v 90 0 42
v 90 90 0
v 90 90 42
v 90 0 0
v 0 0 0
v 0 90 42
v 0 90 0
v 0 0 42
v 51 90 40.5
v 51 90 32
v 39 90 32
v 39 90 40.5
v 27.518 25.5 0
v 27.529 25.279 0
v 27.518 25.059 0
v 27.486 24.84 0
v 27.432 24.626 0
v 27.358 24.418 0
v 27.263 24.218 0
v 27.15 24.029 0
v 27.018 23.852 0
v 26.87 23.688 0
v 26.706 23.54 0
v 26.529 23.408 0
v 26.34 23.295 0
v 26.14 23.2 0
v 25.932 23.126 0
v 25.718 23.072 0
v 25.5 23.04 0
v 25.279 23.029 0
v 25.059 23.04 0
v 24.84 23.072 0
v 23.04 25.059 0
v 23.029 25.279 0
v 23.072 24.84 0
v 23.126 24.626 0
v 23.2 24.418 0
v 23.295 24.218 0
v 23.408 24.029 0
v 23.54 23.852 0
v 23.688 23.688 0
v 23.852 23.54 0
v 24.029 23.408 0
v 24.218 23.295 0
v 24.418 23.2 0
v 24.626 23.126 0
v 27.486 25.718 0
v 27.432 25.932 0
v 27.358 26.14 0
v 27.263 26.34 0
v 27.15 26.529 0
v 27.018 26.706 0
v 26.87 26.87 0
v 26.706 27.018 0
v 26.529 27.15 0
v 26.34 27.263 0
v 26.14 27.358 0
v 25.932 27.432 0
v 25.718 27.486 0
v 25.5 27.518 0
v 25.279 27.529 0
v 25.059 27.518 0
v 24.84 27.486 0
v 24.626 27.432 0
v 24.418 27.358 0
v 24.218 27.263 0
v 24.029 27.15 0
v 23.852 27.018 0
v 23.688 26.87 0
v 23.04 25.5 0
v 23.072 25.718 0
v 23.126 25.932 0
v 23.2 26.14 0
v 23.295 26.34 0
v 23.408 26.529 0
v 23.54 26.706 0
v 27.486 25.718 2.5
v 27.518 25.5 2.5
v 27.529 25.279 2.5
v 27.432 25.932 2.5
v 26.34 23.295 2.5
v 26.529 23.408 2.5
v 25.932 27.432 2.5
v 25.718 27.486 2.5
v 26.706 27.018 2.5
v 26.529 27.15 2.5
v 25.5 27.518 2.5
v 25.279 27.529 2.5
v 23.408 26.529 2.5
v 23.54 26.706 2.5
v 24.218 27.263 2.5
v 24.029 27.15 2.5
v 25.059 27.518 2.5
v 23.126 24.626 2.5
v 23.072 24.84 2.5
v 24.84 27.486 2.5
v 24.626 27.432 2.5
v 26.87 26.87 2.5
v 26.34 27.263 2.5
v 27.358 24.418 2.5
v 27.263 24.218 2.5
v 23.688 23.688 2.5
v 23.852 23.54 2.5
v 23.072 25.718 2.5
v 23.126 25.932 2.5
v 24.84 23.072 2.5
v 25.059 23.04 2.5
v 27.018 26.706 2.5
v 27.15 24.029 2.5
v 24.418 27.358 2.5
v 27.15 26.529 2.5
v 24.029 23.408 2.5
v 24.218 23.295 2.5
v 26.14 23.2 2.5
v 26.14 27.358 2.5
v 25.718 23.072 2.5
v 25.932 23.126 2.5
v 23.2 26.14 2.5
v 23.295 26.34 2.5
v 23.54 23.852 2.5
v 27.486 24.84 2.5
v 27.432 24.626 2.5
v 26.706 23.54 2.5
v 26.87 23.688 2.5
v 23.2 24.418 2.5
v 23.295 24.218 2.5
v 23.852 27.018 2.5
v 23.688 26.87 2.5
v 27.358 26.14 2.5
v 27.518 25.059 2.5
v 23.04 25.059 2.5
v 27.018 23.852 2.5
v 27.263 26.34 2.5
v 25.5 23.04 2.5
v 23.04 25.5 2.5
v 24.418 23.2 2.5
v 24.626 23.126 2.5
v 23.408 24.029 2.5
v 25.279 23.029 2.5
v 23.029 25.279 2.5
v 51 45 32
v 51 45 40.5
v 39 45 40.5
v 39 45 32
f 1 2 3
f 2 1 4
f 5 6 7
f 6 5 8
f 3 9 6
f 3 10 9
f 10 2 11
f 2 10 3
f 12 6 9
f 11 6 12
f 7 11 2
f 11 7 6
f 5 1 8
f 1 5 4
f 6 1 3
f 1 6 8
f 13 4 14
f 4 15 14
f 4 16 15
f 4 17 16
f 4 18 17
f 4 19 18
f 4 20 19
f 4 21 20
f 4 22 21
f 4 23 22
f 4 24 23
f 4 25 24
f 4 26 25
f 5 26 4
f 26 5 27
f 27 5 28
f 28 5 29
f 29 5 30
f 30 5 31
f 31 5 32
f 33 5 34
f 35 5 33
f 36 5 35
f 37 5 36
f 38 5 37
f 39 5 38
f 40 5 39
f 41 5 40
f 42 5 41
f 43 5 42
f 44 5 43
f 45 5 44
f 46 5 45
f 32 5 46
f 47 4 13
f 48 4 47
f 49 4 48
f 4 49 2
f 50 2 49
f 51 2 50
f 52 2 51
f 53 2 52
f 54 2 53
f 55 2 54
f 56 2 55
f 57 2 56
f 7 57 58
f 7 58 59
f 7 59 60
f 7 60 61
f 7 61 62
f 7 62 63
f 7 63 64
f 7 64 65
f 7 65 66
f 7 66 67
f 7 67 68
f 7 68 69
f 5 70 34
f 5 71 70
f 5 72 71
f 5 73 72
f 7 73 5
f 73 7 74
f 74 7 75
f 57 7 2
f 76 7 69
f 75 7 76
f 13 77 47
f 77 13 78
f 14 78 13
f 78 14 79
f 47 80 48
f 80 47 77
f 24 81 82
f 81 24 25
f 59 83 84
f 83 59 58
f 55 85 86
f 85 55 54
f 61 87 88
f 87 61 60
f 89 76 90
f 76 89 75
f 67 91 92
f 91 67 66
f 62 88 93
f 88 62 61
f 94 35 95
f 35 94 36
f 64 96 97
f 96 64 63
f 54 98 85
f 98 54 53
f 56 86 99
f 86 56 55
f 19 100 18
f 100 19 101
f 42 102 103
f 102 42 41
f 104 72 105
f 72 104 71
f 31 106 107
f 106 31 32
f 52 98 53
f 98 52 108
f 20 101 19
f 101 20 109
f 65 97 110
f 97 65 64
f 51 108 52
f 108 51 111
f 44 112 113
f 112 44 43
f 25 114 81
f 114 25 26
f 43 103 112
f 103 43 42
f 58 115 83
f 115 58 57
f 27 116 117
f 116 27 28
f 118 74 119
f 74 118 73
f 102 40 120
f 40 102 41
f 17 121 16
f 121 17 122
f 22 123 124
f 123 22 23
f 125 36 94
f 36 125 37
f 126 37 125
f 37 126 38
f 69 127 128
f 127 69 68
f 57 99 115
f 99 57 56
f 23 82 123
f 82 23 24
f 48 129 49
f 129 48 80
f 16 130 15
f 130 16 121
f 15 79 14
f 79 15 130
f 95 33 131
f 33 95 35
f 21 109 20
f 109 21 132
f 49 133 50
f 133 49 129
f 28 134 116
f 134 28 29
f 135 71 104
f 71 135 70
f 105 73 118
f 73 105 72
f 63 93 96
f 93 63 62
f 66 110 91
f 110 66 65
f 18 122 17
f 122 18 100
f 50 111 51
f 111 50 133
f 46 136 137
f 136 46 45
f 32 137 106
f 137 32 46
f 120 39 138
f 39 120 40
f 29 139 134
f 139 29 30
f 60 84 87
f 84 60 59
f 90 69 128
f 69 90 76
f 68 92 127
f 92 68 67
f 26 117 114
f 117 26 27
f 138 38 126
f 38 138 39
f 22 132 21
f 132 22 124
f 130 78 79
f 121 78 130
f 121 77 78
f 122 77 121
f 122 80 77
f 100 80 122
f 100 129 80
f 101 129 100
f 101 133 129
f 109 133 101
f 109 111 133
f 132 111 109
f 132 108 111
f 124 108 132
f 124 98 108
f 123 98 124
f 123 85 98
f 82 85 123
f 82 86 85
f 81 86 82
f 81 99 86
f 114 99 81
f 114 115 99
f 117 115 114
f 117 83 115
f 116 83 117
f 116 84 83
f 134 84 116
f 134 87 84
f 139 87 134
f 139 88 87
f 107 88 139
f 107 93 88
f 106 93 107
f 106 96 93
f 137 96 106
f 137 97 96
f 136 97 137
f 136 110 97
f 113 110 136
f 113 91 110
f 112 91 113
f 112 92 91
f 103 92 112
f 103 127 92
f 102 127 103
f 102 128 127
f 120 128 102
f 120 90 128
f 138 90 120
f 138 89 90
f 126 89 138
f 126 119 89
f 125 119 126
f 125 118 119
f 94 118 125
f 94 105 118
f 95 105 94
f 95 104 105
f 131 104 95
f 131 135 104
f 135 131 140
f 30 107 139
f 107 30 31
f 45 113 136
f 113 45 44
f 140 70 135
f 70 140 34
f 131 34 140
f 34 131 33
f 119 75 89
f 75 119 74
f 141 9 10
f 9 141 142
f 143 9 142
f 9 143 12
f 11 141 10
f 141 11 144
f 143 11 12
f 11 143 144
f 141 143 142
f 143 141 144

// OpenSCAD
// DIY magnetic stirrer housing - print orientation (upside down)
// Units: mm

$fn = 64;

// --- Dimensions ---
top_t       = 2;     // top plate thickness
wall_t      = 2.5;   // wall thickness
box_h       = 40;    // total height (top plate + walls)
outer_x     = 90;    // outer size in X
outer_y     = 90;    // outer size in Y
screw_h     = 4.5;   // M4 screw hole diameter
screw_n     = 4;     // number of screw holes
screw_pitch = 71.5;  // square pattern diagonal (side = 71.5 / sqrt(2))
notch_w     = 12;    // cable notch width
notch_d     = 8;     // notch depth from open edge
eps         = 0.5;   // cutter overshoot

// Derived
screw_side = screw_pitch / sqrt(2);

difference() {
    // Box body
    union() {
        cube([outer_x, outer_y, top_t]);               // top plate
        for (z = [top_t : wall_t : box_h])
            translate([0, 0, z])
                cube([outer_x, outer_y, wall_t]);      // walls
    }

    // Screw holes through top plate
    for (i = [0 : screw_n - 1])
        rotate([0, 0, i * 90])
            translate([screw_side / 2, screw_side / 2, -eps])
                cylinder(d = screw_h, h = top_t + 2 * eps);

    // Cable notch in one wall (z = 32 to 40)
    translate([outer_x / 2 - notch_w / 2, outer_y / 2, box_h - notch_d])
        cube([notch_w, outer_y, notch_d + eps]);
}
